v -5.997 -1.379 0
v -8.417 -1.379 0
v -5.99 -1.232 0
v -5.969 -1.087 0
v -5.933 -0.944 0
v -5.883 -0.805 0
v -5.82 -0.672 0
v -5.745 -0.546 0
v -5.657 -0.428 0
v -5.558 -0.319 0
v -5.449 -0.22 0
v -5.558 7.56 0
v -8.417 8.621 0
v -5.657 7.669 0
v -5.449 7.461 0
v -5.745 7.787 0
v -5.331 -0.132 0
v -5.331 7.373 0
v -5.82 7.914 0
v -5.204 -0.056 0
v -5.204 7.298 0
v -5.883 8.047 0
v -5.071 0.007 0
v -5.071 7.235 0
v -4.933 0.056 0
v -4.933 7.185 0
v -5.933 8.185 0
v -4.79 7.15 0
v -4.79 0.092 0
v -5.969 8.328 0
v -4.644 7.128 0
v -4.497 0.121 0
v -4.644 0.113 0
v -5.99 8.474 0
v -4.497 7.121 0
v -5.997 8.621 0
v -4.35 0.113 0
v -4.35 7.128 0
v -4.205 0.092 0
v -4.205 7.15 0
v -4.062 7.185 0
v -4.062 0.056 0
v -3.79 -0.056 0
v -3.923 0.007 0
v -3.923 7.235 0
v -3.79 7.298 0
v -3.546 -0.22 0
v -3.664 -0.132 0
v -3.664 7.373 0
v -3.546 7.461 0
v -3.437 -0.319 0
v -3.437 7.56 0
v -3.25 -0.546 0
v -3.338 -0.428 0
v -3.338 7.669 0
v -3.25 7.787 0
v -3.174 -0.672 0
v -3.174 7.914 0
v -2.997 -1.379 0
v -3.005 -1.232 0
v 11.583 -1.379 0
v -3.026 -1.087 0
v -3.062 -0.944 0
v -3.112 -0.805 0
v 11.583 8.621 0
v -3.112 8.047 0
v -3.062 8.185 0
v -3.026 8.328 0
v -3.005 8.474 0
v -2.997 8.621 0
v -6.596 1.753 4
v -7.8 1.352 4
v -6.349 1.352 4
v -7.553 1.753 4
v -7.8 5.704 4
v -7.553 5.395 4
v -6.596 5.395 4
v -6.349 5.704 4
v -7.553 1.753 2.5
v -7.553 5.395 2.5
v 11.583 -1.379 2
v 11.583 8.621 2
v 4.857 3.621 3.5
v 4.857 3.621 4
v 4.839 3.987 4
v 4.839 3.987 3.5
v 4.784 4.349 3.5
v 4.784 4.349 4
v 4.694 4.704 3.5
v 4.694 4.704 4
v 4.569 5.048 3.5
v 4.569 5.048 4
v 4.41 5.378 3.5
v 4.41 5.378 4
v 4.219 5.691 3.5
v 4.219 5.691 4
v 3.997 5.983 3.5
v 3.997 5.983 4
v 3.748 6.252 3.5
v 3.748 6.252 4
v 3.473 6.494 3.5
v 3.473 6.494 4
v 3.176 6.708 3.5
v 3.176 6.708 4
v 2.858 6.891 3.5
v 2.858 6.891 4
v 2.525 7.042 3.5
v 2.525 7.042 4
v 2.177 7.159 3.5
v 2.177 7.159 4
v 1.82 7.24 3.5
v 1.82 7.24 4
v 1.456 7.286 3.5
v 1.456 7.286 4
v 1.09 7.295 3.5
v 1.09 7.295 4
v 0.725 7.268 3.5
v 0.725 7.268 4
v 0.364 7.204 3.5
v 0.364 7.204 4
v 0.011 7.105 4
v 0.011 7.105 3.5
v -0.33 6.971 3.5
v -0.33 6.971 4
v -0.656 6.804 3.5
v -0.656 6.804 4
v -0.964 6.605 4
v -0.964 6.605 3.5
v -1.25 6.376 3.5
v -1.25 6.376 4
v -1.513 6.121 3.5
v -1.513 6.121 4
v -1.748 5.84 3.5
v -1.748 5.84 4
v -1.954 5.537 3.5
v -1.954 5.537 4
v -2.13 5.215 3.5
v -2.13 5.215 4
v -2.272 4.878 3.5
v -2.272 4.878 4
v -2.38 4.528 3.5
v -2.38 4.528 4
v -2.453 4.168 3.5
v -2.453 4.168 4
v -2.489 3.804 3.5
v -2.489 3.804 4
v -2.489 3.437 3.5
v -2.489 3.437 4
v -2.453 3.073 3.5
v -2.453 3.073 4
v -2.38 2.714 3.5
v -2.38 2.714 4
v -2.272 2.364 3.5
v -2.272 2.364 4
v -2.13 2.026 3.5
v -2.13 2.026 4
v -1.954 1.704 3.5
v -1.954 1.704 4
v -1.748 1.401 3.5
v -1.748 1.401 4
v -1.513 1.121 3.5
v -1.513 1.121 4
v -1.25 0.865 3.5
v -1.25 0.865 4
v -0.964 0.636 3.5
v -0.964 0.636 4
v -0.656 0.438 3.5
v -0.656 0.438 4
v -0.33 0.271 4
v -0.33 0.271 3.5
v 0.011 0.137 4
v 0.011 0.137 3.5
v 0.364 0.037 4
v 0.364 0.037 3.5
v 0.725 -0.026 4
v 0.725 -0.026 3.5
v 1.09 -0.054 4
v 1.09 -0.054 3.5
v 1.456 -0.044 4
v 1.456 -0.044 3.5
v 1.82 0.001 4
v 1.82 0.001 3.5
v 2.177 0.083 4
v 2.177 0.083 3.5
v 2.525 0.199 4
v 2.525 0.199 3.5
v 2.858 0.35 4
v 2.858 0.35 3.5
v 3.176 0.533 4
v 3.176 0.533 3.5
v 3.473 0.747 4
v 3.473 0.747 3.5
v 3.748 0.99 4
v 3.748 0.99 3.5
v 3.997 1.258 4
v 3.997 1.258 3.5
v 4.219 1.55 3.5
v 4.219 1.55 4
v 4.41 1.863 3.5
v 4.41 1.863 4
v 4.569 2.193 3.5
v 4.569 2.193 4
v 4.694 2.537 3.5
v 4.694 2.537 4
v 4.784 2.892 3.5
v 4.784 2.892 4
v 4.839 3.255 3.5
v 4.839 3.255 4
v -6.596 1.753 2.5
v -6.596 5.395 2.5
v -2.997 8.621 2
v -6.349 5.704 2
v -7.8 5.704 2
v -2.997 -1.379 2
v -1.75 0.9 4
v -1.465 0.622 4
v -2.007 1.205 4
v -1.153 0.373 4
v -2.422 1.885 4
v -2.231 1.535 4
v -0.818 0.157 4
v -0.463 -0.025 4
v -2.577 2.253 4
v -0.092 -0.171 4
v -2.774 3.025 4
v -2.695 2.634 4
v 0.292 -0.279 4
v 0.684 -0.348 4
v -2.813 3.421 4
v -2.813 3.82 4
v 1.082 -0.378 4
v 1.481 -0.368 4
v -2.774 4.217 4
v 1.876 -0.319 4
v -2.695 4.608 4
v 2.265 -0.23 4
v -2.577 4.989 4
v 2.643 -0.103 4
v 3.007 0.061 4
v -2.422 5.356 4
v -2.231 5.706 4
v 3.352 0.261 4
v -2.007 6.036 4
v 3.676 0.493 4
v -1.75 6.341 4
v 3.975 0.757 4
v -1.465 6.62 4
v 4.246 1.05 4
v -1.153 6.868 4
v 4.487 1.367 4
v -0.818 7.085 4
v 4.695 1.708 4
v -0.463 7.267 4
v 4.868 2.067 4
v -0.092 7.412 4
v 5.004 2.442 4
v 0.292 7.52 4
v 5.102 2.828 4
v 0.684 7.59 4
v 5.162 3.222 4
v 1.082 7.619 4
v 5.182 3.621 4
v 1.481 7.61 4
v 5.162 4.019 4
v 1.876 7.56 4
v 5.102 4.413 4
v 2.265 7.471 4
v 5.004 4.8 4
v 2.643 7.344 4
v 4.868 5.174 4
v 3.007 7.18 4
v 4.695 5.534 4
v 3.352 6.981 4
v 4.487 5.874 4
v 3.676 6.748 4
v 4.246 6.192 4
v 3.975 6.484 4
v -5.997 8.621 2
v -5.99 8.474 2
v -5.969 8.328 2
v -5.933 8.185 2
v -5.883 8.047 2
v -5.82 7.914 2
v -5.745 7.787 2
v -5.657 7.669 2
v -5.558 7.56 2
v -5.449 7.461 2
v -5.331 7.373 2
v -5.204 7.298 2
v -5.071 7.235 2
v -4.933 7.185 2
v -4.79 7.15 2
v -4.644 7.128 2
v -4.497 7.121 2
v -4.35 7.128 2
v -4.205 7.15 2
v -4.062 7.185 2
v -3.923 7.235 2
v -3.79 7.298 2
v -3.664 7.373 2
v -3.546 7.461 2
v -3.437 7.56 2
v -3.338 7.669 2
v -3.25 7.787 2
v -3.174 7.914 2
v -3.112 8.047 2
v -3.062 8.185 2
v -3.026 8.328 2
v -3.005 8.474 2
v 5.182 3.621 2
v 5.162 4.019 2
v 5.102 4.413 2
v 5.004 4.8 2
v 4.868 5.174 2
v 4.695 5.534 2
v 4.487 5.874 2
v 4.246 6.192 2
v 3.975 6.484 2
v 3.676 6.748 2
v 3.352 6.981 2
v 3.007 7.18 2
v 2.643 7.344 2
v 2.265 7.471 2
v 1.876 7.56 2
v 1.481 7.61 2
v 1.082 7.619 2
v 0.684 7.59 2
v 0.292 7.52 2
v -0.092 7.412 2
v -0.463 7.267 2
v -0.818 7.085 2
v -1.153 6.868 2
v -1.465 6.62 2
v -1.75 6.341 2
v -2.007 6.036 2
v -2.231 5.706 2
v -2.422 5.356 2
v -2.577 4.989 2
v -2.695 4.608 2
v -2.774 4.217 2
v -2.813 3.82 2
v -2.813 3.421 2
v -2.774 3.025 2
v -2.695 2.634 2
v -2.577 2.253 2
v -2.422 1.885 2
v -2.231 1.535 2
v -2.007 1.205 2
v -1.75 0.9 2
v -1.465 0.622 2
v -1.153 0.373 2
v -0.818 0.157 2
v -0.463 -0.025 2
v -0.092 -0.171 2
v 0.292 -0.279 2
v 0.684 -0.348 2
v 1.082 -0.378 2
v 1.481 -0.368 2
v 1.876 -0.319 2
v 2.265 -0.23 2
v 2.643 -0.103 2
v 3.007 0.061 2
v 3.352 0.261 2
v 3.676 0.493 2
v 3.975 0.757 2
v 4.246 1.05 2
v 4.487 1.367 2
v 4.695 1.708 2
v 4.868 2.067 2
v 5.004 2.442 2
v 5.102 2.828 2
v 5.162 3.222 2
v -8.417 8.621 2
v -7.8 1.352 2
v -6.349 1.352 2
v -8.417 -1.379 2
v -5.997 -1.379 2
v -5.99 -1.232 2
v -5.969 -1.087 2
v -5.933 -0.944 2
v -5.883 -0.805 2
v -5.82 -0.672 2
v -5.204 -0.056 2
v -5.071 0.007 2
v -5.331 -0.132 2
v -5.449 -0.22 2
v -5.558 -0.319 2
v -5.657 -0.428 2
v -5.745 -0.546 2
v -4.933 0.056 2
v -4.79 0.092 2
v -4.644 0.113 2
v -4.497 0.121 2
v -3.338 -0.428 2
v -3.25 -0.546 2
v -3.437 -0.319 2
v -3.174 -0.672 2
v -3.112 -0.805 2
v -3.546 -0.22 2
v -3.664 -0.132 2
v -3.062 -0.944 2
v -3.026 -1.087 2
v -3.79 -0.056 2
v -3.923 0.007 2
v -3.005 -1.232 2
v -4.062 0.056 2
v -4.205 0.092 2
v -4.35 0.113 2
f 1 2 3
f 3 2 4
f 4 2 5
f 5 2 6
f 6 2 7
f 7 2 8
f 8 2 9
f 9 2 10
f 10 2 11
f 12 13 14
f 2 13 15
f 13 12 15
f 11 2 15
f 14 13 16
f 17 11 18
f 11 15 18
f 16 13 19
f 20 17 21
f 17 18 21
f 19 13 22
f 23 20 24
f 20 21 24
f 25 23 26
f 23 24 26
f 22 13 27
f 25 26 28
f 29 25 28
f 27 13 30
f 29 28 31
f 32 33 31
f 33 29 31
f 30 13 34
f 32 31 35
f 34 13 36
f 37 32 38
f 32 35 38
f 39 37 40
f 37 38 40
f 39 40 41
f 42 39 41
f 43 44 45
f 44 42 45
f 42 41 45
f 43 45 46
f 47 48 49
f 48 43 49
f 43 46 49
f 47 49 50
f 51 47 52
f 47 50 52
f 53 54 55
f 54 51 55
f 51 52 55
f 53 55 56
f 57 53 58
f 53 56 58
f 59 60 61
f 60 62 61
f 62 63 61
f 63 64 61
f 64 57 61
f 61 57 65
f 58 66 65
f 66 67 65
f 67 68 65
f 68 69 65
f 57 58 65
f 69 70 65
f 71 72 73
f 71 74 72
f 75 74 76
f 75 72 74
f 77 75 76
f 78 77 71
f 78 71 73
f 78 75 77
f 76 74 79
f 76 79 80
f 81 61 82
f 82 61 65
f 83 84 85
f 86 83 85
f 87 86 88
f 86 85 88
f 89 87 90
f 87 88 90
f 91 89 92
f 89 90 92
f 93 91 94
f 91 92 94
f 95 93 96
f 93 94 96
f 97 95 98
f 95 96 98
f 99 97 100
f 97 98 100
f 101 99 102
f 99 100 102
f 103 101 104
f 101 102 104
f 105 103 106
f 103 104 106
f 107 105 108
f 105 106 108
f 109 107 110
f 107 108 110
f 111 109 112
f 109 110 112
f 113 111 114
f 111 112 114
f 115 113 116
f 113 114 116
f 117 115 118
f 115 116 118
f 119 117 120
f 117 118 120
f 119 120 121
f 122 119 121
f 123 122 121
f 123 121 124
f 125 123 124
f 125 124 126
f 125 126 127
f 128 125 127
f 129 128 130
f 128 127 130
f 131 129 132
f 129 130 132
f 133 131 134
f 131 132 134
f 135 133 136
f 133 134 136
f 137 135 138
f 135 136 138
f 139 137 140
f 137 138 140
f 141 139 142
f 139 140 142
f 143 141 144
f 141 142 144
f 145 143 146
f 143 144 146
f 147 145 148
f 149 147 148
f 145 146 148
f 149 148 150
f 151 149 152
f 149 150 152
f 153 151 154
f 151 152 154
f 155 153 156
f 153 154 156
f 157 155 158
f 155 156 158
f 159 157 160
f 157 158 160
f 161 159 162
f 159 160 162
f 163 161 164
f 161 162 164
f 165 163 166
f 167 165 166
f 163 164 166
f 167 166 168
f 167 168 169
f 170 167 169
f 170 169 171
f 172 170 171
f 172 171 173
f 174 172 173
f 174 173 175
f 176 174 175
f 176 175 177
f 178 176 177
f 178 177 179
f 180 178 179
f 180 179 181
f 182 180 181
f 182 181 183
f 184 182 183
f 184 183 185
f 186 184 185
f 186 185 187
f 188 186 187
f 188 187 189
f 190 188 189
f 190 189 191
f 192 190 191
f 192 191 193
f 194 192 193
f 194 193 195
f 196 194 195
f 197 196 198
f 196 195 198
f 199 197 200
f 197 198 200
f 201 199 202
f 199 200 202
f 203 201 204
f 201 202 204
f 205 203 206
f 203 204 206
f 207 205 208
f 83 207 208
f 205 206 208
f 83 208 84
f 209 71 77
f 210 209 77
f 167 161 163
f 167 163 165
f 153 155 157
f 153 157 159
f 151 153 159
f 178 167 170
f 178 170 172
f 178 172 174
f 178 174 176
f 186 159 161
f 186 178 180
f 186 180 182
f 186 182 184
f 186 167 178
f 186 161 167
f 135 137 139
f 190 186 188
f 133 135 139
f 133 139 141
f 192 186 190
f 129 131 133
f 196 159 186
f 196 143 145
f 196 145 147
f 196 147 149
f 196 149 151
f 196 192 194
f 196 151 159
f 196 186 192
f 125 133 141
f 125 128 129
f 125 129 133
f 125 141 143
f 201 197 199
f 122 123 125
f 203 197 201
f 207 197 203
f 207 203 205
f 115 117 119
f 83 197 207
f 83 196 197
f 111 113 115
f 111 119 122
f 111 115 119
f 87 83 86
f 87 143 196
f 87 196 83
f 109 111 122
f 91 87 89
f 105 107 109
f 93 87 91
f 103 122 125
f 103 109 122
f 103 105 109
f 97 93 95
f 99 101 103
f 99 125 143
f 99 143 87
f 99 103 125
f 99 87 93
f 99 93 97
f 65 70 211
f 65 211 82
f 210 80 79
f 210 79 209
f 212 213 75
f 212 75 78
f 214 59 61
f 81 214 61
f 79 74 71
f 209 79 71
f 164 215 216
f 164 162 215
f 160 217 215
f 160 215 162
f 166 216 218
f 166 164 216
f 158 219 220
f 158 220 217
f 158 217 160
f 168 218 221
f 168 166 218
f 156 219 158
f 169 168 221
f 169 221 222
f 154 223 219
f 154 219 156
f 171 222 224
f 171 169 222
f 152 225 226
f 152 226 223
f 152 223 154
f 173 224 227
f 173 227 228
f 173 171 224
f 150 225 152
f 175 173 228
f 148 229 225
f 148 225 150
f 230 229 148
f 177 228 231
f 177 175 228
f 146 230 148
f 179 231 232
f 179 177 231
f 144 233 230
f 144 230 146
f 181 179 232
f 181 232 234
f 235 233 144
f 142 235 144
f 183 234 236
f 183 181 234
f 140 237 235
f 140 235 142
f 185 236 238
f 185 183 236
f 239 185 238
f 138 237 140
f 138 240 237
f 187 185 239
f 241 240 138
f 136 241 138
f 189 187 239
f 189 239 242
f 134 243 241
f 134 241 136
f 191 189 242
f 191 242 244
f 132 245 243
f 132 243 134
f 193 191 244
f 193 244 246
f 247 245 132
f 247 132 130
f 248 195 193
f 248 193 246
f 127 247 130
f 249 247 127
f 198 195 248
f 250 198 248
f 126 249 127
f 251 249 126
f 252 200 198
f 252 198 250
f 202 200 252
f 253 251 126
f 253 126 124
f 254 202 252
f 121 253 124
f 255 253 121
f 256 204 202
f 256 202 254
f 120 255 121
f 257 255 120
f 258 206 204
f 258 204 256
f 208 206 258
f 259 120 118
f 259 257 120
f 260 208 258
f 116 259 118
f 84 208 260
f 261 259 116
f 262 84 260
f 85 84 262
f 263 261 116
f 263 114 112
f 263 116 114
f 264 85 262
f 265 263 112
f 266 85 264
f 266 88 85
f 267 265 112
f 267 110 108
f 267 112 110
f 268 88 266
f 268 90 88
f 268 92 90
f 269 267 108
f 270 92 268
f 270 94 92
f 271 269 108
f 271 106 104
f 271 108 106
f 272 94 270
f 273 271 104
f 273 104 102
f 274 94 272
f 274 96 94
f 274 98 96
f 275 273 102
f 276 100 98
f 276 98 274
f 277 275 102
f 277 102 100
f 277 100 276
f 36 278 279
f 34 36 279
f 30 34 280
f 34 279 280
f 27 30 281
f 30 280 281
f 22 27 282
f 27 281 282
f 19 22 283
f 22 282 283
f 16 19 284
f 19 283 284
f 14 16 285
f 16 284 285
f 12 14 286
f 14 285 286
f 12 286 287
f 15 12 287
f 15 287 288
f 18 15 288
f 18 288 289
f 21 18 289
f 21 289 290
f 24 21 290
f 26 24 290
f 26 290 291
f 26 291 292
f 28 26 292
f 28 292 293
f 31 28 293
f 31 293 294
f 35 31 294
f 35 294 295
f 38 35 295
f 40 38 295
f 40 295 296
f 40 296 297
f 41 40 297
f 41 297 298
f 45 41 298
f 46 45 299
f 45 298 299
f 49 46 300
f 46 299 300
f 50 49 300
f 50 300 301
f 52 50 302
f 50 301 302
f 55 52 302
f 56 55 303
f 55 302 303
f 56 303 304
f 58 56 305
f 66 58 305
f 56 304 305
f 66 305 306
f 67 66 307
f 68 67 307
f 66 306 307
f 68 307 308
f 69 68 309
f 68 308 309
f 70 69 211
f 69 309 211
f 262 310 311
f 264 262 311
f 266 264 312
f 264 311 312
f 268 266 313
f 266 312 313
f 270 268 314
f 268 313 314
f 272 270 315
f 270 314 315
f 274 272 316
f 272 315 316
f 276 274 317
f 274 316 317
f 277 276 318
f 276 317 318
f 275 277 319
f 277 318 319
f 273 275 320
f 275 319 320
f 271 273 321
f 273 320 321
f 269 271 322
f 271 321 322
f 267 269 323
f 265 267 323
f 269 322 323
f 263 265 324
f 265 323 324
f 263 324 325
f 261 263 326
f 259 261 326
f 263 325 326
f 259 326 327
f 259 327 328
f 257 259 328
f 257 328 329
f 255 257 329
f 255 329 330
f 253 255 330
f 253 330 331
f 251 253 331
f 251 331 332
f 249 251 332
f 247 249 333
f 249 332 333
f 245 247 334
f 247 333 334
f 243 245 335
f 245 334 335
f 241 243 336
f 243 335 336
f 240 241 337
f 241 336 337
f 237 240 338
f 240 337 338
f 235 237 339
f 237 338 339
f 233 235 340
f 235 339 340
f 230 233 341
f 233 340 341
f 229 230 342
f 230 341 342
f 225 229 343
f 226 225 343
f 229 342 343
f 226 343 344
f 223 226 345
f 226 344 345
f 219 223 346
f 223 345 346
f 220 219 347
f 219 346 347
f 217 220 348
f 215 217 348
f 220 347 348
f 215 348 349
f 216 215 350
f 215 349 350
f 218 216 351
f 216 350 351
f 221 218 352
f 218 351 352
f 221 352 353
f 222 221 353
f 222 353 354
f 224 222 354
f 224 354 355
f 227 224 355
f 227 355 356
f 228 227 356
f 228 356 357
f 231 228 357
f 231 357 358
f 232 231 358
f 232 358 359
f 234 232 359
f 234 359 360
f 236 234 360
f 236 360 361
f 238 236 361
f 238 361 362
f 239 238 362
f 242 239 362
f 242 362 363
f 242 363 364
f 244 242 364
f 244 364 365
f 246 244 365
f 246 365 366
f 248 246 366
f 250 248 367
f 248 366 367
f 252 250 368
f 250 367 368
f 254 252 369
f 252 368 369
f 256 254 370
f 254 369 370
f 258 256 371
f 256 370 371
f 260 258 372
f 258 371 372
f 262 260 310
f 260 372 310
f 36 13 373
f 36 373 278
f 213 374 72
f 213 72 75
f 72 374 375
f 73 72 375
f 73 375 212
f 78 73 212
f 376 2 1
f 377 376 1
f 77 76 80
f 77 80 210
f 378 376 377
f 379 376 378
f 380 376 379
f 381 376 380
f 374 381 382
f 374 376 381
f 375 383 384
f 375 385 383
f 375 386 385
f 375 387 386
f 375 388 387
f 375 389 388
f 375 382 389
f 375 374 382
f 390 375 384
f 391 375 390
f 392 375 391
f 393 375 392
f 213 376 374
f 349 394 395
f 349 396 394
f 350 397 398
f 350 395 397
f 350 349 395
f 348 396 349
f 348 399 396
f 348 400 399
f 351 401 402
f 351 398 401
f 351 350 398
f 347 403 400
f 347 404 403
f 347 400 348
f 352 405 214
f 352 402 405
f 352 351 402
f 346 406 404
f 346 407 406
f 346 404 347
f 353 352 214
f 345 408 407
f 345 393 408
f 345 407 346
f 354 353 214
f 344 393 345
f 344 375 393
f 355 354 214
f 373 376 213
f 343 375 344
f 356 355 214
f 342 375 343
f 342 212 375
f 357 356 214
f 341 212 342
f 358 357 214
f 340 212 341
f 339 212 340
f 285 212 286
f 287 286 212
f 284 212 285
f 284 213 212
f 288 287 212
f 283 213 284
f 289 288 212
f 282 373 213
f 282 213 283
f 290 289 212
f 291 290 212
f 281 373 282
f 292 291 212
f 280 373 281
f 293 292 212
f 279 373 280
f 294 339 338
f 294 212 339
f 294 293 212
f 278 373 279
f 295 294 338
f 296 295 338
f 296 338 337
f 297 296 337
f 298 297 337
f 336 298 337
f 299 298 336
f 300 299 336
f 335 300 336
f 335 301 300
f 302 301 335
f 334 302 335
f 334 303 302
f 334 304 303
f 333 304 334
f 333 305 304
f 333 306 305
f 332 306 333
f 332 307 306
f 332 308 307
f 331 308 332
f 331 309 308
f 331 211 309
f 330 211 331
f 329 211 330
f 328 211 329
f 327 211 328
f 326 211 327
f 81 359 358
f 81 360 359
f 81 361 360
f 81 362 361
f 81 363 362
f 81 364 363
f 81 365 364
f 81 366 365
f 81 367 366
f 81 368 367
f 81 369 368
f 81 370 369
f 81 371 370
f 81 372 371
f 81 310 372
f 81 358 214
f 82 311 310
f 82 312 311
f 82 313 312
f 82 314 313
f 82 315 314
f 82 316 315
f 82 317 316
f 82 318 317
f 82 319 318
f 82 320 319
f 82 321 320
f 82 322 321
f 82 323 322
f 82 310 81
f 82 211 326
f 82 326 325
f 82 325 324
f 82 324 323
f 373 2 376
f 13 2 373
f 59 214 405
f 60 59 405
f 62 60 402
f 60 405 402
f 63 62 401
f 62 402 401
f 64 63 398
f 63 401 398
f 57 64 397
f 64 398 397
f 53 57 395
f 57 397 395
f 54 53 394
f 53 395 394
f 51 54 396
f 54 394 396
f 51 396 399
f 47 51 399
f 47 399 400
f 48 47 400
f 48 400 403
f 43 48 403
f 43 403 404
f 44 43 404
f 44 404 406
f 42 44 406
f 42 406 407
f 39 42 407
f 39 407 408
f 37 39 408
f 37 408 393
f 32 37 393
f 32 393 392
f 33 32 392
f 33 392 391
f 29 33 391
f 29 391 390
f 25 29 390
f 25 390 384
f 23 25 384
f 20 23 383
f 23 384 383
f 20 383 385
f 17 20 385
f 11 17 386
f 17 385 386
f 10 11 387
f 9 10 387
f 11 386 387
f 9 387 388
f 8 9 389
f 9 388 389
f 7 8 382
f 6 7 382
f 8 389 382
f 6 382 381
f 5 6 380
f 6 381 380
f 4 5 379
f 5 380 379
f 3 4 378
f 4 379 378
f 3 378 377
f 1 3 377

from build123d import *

# Parameters (mm, degrees)
ESQUISSE1_W             = 20
ESQUISSE1_H             = 10
BOSS_EXTRU_1_DEPTH      = 2
ESQUISSE2_R             = 1.5
ENL_V_MAT_EXTRU_1_DEPTH = 2
ESQUISSE3_R             = 4
BOSS_EXTRU_2_DEPTH      = 2
ESQUISSE4_R             = 3.675436607
ENL_V_MAT_EXTRU_2_DEPTH = 0.5
ESQUISSE5_W             = 1.450639668
ESQUISSE5_H             = 4.351919005
BOSS_EXTRU_3_DEPTH      = 2
ESQUISSE6_W             = 0.956804888
ESQUISSE6_H             = 3.642031508
ENL_V_MAT_EXTRU_3_DEPTH = 1.5


with BuildPart() as part:
    # Esquisse1 → Boss.-Extru.1 (new body)
    with BuildSketch(Plane.XY):
        with Locations((1.582964004, 3.620689655)):
            Rectangle(ESQUISSE1_W, ESQUISSE1_H)
    extrude(amount=BOSS_EXTRU_1_DEPTH)

    # Esquisse2 → Enlèv. mat.-Extru.1 (cut)
    with BuildSketch(Plane.XY.offset(2)):
        with Locations((-4.497376734, 8.620689655)):
            Circle(ESQUISSE2_R)
        with Locations((-4.497376734, -1.379310345)):
            Circle(ESQUISSE2_R)
    extrude(amount=-ENL_V_MAT_EXTRU_1_DEPTH, mode=Mode.SUBTRACT)

    # Esquisse3 → Boss.-Extru.2 (add)
    with BuildSketch(Plane.XY.offset(2)):
        with Locations((1.181723245, 3.620689655)):
            Circle(ESQUISSE3_R)
    extrude(amount=BOSS_EXTRU_2_DEPTH)

    # Esquisse4 → Enlèv. mat.-Extru.2 (cut)
    with BuildSketch(Plane.XY.offset(4)):
        with Locations((1.181723245, 3.620689655)):
            Circle(ESQUISSE4_R)
    extrude(amount=-ENL_V_MAT_EXTRU_2_DEPTH, mode=Mode.SUBTRACT)

    # Esquisse5 → Boss.-Extru.3 (add)
    with BuildSketch(Plane.XY.offset(2)):
        with Locations((-7.074576996, 3.528095633)):
            Rectangle(ESQUISSE5_W, ESQUISSE5_H)
    extrude(amount=BOSS_EXTRU_3_DEPTH)

    # Esquisse6 → Enlèv. mat.-Extru.3 (cut)
    with BuildSketch(Plane.XY.offset(4)):
        with Locations((-7.074576996, 3.574392644)):
            Rectangle(ESQUISSE6_W, ESQUISSE6_H)
    extrude(amount=-ENL_V_MAT_EXTRU_3_DEPTH, mode=Mode.SUBTRACT)


solid = part.part
